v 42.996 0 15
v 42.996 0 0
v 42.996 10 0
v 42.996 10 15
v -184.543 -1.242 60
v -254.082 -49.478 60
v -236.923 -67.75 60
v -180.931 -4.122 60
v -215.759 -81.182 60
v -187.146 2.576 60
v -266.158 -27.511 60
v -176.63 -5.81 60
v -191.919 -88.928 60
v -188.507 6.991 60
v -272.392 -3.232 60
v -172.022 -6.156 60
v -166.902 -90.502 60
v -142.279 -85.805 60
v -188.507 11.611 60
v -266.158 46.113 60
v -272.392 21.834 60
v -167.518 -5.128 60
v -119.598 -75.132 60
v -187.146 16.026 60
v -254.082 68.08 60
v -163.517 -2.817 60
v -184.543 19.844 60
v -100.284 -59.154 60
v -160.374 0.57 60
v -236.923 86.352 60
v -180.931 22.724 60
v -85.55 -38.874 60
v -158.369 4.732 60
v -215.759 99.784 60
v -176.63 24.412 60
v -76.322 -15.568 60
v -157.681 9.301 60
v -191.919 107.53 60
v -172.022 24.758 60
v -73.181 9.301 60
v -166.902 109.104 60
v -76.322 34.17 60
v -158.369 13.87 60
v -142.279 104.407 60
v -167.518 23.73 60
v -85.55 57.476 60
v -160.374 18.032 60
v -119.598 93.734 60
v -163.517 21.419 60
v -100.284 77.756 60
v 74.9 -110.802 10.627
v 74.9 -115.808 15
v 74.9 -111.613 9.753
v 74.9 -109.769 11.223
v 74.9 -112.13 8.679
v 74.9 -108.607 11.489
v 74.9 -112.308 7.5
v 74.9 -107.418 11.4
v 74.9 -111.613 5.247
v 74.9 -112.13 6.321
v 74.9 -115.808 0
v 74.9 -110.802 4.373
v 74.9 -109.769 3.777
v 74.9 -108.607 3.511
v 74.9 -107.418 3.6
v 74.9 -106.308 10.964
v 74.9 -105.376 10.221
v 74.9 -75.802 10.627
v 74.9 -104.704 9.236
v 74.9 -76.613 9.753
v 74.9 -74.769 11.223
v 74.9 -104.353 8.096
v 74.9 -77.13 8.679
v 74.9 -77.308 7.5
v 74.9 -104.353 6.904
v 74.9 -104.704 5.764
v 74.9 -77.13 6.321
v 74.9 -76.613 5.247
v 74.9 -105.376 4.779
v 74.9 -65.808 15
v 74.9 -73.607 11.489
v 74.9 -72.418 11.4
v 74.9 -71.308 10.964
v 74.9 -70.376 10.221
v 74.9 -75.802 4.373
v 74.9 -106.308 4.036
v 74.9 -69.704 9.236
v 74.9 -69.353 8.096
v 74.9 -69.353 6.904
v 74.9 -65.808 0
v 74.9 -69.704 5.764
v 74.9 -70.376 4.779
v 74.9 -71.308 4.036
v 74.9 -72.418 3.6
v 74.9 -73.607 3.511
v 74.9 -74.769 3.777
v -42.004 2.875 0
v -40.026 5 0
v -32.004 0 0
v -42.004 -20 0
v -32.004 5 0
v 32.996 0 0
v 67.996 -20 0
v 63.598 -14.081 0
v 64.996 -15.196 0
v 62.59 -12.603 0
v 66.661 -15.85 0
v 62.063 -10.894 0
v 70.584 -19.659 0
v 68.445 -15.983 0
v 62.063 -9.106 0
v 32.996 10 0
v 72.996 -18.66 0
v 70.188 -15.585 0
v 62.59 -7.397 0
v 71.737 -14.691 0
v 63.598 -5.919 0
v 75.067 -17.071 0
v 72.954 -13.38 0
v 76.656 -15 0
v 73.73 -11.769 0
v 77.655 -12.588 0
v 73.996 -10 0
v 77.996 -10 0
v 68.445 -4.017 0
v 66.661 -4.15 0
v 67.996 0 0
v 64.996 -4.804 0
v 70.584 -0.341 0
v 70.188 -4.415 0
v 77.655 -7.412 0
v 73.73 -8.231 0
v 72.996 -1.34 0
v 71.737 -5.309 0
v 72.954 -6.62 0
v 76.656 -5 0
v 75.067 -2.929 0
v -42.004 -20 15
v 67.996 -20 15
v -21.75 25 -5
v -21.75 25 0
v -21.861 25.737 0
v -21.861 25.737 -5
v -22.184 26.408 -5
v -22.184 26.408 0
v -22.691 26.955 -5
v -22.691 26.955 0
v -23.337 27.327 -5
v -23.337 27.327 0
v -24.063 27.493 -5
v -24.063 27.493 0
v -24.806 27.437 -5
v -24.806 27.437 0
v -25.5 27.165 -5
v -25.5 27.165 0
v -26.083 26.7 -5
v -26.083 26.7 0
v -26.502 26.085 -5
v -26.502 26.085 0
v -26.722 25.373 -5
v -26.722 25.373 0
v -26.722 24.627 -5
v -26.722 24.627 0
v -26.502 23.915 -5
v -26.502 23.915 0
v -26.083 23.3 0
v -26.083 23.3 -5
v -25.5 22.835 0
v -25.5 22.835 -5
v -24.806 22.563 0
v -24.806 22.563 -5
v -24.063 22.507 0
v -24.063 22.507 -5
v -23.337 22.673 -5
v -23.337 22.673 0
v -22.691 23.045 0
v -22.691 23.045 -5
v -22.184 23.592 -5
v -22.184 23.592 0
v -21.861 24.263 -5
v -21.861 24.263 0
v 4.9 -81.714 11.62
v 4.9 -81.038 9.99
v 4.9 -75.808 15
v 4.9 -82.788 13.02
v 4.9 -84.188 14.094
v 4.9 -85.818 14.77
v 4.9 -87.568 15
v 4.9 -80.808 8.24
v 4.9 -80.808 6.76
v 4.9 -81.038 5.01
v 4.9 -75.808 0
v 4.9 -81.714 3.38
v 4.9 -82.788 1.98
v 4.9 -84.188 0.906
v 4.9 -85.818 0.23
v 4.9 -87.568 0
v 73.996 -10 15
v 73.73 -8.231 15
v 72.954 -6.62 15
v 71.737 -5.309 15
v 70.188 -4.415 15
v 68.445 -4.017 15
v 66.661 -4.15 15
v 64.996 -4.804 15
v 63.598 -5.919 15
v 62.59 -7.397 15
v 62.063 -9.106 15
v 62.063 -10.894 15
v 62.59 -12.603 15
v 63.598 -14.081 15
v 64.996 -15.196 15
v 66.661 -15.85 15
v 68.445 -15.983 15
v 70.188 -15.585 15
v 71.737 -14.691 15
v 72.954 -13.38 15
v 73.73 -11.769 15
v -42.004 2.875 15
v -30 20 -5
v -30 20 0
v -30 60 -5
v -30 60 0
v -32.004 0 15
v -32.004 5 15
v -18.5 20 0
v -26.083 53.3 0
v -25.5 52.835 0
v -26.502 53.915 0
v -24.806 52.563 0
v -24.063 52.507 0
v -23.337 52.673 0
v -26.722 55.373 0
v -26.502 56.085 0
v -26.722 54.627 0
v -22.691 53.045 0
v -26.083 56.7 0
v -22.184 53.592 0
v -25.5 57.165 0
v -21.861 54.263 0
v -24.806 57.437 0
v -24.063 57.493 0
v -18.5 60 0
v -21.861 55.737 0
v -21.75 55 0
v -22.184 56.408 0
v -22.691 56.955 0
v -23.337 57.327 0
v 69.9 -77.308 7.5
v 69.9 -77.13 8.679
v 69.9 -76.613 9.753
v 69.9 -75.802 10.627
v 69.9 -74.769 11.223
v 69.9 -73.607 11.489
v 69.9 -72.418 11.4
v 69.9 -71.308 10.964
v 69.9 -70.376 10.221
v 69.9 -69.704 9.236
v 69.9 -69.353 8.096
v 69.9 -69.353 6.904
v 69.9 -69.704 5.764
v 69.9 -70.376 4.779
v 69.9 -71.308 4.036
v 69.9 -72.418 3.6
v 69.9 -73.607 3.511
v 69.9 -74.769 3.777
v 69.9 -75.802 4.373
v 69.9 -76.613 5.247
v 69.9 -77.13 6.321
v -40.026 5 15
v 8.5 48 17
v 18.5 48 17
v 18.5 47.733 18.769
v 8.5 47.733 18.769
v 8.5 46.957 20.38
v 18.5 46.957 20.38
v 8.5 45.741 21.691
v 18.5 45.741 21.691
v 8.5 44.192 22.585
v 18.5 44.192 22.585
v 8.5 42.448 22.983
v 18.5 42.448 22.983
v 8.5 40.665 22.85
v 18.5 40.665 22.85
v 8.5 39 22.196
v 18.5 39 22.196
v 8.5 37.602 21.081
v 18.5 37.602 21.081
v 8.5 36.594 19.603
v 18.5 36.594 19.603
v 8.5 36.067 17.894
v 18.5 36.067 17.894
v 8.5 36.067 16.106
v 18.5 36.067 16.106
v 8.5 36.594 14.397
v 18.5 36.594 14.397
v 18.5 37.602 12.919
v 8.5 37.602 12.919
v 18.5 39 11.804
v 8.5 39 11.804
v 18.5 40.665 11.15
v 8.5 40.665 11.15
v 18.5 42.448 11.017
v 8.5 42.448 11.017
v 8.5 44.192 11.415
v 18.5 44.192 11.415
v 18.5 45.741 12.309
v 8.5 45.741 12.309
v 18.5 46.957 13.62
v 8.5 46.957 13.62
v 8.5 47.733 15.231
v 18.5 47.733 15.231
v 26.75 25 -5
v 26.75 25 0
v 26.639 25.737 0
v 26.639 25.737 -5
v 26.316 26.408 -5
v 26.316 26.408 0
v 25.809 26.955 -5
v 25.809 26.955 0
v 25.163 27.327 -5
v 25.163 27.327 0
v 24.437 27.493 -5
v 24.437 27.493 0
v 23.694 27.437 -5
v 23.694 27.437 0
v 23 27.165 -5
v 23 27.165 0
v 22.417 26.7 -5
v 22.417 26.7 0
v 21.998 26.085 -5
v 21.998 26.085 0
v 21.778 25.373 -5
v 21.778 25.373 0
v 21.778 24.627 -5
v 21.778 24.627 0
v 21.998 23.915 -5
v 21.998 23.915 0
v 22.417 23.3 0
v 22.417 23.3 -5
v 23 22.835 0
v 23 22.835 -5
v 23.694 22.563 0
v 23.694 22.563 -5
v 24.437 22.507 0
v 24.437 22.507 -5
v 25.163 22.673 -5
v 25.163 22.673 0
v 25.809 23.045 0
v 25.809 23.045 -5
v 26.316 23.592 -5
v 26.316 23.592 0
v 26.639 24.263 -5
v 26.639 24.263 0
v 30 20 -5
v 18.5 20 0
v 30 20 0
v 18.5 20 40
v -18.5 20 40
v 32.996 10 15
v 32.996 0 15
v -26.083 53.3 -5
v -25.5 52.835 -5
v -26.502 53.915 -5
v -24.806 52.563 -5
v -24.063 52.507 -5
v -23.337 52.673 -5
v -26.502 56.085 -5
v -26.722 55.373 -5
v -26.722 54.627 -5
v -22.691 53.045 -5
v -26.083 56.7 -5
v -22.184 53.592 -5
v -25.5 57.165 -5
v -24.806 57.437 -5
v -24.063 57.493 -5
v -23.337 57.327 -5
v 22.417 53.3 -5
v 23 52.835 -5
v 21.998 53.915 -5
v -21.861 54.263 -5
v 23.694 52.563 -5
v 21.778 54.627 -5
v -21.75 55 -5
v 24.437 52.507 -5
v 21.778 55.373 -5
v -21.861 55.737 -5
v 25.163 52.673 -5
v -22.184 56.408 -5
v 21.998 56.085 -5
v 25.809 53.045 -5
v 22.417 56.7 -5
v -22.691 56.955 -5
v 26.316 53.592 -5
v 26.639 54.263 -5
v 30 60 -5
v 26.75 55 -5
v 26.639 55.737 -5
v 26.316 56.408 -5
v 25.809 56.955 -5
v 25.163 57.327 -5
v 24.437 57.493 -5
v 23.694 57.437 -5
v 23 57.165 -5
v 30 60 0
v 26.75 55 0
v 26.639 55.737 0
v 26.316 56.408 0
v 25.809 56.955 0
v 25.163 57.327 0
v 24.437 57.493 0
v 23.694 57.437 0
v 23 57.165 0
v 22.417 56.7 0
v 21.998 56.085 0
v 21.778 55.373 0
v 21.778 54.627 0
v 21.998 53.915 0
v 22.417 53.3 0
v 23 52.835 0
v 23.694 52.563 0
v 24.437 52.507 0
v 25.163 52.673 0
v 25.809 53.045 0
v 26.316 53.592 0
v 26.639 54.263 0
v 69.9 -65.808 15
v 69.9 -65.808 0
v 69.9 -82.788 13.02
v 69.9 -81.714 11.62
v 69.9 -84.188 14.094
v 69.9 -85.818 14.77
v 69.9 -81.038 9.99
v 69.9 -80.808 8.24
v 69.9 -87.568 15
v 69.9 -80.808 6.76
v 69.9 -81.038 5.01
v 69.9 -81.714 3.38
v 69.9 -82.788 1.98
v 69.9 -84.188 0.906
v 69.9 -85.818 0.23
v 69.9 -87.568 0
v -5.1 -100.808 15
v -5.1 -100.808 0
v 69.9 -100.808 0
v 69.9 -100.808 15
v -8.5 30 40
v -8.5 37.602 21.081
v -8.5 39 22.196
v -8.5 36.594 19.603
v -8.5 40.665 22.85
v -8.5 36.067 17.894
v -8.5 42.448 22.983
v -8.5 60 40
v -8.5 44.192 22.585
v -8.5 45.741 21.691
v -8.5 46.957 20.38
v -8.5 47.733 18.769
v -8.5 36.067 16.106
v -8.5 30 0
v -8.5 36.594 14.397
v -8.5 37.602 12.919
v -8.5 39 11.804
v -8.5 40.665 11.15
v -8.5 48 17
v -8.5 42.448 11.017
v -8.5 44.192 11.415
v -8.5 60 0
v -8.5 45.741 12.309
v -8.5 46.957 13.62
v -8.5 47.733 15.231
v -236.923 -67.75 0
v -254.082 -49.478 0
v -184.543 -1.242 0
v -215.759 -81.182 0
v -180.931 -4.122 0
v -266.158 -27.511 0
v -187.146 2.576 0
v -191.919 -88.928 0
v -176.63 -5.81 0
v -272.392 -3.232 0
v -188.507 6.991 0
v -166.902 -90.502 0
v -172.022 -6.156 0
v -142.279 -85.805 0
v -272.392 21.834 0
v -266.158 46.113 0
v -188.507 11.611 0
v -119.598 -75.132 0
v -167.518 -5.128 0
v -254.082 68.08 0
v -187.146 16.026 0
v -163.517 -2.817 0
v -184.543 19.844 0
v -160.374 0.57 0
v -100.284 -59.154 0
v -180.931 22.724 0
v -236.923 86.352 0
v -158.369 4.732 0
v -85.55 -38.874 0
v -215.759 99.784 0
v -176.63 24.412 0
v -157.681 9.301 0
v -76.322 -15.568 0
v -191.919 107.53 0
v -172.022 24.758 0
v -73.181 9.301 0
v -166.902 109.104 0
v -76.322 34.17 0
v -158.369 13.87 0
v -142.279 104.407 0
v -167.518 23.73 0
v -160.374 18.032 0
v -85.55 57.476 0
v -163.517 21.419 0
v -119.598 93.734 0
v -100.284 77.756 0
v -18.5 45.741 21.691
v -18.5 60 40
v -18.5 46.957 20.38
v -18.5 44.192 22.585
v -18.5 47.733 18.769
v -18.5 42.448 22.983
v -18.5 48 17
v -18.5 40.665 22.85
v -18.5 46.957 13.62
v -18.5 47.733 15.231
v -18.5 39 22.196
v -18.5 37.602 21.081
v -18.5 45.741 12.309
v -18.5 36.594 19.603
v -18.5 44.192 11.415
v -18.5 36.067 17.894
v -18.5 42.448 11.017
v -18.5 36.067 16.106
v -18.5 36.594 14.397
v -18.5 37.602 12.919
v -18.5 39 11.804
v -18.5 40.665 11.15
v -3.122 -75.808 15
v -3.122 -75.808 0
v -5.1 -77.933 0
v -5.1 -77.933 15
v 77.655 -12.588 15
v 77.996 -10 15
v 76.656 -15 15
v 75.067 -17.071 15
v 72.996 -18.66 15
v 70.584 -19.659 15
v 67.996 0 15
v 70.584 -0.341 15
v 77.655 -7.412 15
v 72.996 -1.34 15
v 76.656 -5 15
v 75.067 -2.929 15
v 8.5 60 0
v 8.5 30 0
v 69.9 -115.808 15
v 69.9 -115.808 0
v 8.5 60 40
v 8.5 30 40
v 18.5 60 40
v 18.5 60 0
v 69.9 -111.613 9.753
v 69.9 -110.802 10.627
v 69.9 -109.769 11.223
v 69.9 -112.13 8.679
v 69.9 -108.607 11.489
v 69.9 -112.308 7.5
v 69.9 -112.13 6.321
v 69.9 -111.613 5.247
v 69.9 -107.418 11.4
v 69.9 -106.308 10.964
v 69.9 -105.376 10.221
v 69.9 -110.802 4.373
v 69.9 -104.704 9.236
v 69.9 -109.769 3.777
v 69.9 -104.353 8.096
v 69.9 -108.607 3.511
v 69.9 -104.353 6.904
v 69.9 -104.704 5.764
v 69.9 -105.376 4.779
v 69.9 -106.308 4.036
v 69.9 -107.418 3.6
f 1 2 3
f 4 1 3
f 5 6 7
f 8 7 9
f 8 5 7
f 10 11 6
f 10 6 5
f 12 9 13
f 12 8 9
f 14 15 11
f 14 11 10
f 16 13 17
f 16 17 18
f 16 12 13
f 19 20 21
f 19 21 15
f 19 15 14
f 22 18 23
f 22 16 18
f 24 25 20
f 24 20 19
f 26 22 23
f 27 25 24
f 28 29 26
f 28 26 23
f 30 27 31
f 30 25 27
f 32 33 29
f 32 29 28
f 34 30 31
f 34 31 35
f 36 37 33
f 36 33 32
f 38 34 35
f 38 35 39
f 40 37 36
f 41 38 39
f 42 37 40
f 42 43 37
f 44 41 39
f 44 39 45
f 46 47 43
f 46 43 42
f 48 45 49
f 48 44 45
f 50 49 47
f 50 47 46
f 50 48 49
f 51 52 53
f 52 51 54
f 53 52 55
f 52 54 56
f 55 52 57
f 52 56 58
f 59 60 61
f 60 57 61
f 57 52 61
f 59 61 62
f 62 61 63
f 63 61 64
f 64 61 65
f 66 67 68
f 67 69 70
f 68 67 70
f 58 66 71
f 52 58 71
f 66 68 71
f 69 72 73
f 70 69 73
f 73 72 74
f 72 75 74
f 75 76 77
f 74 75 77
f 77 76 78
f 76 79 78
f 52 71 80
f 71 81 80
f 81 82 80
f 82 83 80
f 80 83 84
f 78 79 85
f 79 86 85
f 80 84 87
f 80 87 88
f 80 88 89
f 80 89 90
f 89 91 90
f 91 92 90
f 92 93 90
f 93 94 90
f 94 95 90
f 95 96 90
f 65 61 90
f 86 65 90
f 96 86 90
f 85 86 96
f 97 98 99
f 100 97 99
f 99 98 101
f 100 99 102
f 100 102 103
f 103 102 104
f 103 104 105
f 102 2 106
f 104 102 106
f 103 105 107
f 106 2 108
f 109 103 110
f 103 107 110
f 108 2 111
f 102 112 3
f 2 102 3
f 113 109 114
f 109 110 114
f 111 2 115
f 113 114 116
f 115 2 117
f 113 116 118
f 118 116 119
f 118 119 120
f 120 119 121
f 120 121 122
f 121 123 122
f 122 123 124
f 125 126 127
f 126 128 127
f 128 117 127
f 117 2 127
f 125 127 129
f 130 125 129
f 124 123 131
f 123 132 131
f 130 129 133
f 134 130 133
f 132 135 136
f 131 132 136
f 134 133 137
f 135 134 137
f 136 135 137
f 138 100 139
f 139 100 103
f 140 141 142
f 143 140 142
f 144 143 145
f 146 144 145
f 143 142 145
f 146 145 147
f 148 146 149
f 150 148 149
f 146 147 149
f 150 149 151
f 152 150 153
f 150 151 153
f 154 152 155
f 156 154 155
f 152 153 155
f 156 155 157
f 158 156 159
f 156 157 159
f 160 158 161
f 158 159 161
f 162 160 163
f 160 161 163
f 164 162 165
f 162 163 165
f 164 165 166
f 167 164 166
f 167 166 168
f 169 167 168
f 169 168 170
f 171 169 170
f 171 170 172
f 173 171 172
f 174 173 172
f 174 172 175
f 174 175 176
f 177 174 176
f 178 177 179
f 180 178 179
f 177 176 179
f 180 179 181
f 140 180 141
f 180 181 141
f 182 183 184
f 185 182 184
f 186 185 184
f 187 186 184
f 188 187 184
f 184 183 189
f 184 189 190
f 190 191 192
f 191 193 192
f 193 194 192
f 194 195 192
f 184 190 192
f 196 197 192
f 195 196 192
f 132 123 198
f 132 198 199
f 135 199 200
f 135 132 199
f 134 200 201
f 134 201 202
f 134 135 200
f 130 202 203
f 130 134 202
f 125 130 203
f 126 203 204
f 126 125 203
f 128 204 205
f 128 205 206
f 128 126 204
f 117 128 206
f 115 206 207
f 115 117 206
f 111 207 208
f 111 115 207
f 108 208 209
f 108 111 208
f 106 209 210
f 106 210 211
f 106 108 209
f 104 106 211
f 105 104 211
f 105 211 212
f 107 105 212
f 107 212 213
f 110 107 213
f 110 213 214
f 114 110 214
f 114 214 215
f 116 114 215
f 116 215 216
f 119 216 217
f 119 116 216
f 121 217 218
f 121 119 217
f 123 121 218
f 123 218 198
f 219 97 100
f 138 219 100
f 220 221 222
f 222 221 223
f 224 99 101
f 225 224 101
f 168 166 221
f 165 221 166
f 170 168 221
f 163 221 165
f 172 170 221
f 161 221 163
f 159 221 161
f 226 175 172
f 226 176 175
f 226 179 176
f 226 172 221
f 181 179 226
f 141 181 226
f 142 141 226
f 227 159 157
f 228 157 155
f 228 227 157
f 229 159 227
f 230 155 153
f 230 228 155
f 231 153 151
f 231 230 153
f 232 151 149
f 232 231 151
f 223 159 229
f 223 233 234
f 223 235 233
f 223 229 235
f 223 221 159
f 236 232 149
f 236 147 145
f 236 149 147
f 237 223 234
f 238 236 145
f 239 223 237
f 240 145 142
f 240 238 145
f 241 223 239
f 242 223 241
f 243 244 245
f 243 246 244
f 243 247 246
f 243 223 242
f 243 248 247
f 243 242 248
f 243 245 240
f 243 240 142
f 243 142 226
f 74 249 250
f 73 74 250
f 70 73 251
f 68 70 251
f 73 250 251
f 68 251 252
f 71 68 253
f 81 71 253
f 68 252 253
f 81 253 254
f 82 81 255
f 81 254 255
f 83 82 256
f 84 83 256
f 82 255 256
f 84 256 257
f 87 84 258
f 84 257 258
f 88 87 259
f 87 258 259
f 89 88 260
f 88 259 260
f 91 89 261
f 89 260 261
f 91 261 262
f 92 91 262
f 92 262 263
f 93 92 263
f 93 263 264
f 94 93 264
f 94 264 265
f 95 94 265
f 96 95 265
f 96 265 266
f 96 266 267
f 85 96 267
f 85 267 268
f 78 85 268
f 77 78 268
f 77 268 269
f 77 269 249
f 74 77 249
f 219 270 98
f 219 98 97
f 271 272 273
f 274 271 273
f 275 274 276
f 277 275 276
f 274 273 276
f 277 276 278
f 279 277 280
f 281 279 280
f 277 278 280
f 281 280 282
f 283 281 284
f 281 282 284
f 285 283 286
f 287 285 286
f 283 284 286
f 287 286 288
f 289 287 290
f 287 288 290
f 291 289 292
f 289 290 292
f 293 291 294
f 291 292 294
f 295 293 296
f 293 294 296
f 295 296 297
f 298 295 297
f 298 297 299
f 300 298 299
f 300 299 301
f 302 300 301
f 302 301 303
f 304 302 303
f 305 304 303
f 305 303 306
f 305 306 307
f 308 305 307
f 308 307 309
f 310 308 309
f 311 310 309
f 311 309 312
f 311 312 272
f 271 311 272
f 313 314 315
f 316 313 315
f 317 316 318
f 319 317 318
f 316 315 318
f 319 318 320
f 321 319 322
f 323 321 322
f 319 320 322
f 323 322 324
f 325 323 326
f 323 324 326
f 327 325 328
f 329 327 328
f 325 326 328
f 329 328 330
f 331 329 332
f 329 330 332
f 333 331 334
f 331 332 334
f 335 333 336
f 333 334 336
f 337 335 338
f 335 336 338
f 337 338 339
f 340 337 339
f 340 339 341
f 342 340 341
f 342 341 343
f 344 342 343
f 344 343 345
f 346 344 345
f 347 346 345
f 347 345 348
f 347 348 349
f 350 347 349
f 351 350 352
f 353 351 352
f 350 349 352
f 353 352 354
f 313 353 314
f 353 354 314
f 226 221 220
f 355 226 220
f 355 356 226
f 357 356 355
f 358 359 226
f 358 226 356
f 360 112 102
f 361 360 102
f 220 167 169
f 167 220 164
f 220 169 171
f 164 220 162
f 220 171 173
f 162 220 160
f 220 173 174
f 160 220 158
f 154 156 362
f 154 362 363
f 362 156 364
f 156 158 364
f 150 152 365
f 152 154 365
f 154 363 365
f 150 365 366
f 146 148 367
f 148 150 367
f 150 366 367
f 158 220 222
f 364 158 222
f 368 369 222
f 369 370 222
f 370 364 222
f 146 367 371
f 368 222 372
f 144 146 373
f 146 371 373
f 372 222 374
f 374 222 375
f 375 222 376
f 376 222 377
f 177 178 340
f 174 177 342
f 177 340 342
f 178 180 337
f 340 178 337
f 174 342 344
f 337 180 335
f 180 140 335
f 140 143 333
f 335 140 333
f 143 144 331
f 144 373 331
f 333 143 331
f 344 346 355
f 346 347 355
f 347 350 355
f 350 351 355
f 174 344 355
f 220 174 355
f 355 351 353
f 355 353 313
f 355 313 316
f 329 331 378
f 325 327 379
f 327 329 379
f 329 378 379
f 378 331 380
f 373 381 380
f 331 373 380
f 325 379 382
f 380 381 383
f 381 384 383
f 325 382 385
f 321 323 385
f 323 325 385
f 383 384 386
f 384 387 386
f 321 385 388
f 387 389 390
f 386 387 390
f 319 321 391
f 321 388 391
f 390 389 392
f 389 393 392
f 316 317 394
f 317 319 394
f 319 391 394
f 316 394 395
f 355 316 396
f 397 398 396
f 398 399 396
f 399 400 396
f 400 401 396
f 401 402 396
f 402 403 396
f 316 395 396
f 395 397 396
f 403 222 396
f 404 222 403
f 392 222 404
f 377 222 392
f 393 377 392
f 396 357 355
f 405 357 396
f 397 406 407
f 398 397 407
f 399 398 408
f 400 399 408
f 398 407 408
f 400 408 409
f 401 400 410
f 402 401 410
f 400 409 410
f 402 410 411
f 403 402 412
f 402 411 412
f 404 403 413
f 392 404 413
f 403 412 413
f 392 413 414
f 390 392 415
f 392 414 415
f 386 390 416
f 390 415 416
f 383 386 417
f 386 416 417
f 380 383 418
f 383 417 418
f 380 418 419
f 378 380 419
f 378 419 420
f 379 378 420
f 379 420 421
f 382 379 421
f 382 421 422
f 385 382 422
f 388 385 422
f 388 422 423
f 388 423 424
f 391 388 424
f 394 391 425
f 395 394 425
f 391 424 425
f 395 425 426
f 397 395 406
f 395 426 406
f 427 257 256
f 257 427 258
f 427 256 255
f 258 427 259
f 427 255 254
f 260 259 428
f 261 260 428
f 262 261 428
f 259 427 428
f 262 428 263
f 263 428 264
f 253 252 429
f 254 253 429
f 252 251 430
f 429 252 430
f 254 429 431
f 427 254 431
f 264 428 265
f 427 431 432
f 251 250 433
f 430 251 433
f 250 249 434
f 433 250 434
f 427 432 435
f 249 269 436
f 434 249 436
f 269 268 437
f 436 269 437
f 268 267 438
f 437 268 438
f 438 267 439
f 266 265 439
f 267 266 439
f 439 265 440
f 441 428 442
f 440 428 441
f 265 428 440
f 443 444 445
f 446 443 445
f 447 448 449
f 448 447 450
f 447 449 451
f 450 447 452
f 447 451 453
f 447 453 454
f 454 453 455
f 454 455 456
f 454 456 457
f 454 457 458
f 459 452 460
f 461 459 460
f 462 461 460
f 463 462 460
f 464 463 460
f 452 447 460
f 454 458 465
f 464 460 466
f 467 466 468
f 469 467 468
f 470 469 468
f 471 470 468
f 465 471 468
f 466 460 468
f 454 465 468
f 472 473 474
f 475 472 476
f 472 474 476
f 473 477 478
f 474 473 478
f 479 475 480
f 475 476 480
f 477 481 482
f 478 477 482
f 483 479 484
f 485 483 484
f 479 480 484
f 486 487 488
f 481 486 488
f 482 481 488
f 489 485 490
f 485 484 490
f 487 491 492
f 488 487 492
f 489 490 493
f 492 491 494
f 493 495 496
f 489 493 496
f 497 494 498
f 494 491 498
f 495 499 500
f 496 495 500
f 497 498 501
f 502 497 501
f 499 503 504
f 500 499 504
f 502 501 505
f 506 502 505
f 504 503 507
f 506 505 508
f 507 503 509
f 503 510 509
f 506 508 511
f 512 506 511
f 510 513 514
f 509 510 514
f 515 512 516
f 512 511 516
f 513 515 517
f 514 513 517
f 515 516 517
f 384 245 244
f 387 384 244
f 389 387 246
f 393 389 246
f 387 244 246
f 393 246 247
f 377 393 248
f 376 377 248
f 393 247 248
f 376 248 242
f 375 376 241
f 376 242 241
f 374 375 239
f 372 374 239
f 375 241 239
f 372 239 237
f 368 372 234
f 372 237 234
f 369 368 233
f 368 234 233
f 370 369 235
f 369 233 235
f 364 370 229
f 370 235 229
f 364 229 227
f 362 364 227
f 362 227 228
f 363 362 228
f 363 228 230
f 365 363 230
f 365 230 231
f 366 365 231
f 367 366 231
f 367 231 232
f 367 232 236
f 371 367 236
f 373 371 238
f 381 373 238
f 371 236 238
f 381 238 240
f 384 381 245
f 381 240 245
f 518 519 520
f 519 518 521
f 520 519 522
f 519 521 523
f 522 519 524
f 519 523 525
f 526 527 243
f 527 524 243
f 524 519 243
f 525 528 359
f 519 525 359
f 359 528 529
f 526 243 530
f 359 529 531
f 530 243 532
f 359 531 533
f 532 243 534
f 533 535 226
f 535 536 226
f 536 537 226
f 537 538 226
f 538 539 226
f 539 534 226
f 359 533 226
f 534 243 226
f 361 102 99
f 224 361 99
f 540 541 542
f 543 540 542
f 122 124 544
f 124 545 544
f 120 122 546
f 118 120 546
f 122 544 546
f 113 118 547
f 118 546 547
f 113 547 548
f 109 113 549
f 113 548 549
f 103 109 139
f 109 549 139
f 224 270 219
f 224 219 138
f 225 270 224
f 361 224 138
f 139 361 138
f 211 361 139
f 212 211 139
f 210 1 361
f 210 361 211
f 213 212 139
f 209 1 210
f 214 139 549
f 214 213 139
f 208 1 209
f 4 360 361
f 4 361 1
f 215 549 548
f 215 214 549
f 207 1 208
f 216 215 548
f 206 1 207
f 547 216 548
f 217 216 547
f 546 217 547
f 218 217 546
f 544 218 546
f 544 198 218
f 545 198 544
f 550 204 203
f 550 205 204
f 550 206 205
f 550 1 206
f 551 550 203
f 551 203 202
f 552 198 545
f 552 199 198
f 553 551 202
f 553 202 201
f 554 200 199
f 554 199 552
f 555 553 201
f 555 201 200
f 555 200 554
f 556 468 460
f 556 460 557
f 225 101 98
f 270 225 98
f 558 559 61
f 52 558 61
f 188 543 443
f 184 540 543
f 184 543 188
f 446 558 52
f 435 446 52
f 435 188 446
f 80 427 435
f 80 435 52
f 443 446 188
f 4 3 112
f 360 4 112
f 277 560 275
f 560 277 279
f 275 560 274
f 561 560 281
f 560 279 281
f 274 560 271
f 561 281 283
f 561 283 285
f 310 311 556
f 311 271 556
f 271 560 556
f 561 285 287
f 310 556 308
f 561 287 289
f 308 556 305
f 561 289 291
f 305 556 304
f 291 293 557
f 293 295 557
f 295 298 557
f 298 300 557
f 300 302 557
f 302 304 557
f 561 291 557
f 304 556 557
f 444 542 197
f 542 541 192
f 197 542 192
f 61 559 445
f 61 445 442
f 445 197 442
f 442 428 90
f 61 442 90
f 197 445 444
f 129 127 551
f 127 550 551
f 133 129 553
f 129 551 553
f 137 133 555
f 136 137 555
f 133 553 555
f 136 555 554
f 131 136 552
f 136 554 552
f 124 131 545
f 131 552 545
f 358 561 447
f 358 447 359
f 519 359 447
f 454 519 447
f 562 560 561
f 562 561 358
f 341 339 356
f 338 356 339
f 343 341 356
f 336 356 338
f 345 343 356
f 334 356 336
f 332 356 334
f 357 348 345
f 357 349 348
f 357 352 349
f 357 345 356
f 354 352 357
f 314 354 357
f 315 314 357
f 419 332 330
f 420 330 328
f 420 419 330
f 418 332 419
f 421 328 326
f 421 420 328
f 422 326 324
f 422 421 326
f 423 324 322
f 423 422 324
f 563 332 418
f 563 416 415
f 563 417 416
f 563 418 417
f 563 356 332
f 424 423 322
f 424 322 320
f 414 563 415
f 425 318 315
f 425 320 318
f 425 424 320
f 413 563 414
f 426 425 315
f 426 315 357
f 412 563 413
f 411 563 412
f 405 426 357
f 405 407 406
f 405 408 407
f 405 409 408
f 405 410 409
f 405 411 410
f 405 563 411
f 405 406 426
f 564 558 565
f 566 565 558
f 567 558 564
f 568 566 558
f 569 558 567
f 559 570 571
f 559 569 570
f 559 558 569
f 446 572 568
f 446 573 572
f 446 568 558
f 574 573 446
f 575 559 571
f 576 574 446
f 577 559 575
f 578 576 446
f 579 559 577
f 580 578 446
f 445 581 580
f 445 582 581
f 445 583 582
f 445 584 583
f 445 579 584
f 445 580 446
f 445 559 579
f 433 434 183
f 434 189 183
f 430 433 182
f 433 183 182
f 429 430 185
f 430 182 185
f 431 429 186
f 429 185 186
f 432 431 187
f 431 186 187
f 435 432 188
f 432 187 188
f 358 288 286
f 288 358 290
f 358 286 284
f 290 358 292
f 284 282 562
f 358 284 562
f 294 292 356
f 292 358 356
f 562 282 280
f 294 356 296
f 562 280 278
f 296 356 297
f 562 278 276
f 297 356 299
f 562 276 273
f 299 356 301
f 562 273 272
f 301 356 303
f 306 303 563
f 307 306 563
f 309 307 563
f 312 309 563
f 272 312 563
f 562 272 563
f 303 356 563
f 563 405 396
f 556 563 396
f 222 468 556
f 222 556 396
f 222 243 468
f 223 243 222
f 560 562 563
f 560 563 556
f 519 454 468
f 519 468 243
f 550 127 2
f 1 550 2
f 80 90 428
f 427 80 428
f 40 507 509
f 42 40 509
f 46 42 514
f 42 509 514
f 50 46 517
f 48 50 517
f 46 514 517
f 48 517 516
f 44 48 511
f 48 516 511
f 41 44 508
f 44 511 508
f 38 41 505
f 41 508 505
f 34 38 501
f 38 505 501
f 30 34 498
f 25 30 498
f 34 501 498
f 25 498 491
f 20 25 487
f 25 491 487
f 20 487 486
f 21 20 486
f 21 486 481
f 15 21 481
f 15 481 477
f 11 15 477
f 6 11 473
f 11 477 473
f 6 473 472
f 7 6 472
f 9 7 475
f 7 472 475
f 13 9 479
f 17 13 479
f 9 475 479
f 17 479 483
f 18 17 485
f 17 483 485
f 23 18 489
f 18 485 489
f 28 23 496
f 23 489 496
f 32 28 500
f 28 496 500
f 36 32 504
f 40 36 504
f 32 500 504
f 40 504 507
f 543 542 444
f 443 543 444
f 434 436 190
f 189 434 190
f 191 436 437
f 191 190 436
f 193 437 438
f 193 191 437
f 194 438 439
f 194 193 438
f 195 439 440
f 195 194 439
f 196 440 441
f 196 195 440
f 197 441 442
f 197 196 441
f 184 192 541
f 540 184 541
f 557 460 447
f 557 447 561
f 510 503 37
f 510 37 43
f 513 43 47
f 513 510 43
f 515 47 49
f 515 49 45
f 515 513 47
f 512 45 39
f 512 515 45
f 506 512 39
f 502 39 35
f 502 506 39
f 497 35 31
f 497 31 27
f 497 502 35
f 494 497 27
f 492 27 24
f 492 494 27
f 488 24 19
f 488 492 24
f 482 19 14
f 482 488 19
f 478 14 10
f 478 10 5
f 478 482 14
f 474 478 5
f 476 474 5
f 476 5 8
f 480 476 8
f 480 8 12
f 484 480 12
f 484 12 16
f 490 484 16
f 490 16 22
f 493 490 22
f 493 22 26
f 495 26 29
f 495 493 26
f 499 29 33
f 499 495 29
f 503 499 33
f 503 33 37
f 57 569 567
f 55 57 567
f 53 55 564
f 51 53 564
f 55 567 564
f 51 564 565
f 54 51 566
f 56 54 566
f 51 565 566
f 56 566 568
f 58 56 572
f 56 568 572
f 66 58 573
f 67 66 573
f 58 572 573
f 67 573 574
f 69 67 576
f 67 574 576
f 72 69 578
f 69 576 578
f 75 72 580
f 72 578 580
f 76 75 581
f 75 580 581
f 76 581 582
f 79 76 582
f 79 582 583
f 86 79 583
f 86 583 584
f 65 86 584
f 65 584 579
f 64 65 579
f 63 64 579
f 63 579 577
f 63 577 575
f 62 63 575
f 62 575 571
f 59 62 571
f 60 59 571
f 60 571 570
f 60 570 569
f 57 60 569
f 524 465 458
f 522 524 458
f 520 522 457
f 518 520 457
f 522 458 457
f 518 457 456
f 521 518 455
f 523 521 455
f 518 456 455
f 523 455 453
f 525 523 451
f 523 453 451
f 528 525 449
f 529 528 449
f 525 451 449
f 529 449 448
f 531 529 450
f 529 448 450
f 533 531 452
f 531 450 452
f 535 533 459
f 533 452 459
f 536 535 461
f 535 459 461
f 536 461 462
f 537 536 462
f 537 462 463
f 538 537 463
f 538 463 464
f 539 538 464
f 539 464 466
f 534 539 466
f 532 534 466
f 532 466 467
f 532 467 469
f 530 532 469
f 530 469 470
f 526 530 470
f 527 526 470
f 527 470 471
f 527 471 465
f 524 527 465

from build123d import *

# Parameters (mm, degrees)
F0_R      = 6
F1_DEPTH  = 15
F0_W      = 11.5
F0_H      = 40
F0_R_2    = 2.5
F0_W_2    = 17
F0_H_2    = 10
F0_H_3    = 30
F2_DEPTH  = 5
F3_DEPTH  = 40
F4_R      = 9.99999
F5_R      = 6
F6_DEPTH  = 52.2
F0_R_3    = 100
F0_R_4    = 15.5
F7_DEPTH  = 60
F0_W_3    = 5
F0_H_4    = 15
F0_H_5    = 20
F8_DEPTH  = 15
F9_R      = 4
F10_DEPTH = 25
F11_R     = 6.7597979746


# Not quite as in the source:
# - a fillet or chamfer is up to 0.001 mm smaller than in the source, because OpenCascade refuses the exact size


with BuildPart() as f1:
    # F0 (on Top) → F1 (new body)
    with BuildSketch(Plane.XY):
        Polygon((32.9961277544, 0), (-32.0038722456, 0), (-32.0038722456, 5), (-40.0256873742, 5), (-42.0038722456, 2.8751766719), (-42.0038722456, 0), (-42.0038722456, -20), (77.9961277544, -20), (77.9961277544, 0), (42.9961277544, 0), (42.9961277544, 10), (32.9961277544, 10), align=None)
        with Locations((67.9961277544, -10)):
            Circle(F0_R, mode=Mode.SUBTRACT)
    extrude(amount=F1_DEPTH)

    # F4 (radius 10 in the source; OpenCascade refuses exactly that, so slightly less here)
    f4_edges = [f1.edges().sort_by_distance(p)[0] for p in [
        (77.996128, 0, 7.5),
        (77.996128, -20, 7.5),
    ]]
    fillet(f4_edges, radius=F4_R)


with BuildPart() as f2:
    # F0 (on Top) → F2 (new body)
    with BuildSketch(Plane.XY):
        with Locations((-24.25, 40)):
            Rectangle(F0_W, F0_H)
        with Locations((-24.25, 25)):
            Circle(F0_R_2, mode=Mode.SUBTRACT)
        with Locations((-24.25, 55)):
            Circle(F0_R_2, mode=Mode.SUBTRACT)
        Polygon((-8.5, 30), (-8.5, 60), (-18.5, 60), (-18.5, 20), (-8.5, 20), align=None)
        with Locations((0, 25)):
            Rectangle(F0_W_2, F0_H_2)
        Polygon((18.5, 20), (18.5, 60), (8.5, 60), (8.5, 30), (8.5, 20), align=None)
        with Locations((24.25, 40)):
            Rectangle(F0_W, F0_H)
        with Locations((24.25, 25)):
            Circle(F0_R_2, mode=Mode.SUBTRACT)
        with Locations((24.25, 55)):
            Circle(F0_R_2, mode=Mode.SUBTRACT)
        with Locations((0, 45)):
            Rectangle(F0_W_2, F0_H_3)
    extrude(amount=-F2_DEPTH)

    # F0 (on Top) → F3 (join)
    with BuildSketch(Plane.XY):
        Polygon((-8.5, 30), (-8.5, 60), (-18.5, 60), (-18.5, 20), (-8.5, 20), align=None)
        Polygon((18.5, 20), (18.5, 60), (8.5, 60), (8.5, 30), (8.5, 20), align=None)
        with Locations((0, 25)):
            Rectangle(F0_W_2, F0_H_2)
    extrude(amount=F3_DEPTH)

    # F5 (on face) → F6 (cut)
    with BuildSketch(Plane.YZ.offset(18.5)):
        with Locations((42, 17)):
            Circle(F5_R)
    extrude(amount=-F6_DEPTH, mode=Mode.SUBTRACT)


with BuildPart() as f7:
    # F0 (on Top) → F7 (new body)
    with BuildSketch(Plane.XY):
        with Locations((-173.1806099415, 9.3010207638)):
            Circle(F0_R_3)
        with Locations((-173.1806099415, 9.3010207638)):
            Circle(F0_R_4, mode=Mode.SUBTRACT)
    extrude(amount=F7_DEPTH)


with BuildPart() as f8:
    # F0 (on Top) → F8 (new body)
    with BuildSketch(Plane.XY):
        Polygon((59.8999890685, -80.8080112338), (4.8999890685, -80.8080112338), (4.8999890685, -75.8080112338), (-3.1218260601, -75.8080112338), (-5.1000109315, -77.9328345619), (-5.1000109315, -80.8080112338), (-5.1000109315, -100.8080112338), (69.8999890685, -100.8080112338), (69.8999890685, -80.8080112338), align=None)
        Polygon((69.8999890685, -70.8080112338), (69.8999890685, -80.8080112338), (74.8999890685, -80.8080112338), (74.8999890685, -65.8080112338), (69.8999890685, -65.8080112338), align=None)
        with Locations((72.3999890685, -108.3080112338)):
            Rectangle(F0_W_3, F0_H_4)
        with Locations((72.3999890685, -90.8080112338)):
            Rectangle(F0_W_3, F0_H_5)
    extrude(amount=F8_DEPTH)

    # F9 (on face) → F10 (cut)
    with BuildSketch(Plane(origin=(69.8999890685, 0, 0), x_dir=(0, -1, 0), z_dir=(-1, 0, 0))):
        with Locations((73.3080112338, 7.5)):
            Circle(F9_R)
        with Locations((108.3080112338, 7.5)):
            Circle(F9_R)
    extrude(amount=-F10_DEPTH, mode=Mode.SUBTRACT)

    # F11
    f11_edges = [f8.edges().sort_by_distance(p)[0] for p in [
        (37.399989, -80.808011, 0),
        (37.399989, -80.808011, 15),
    ]]
    fillet(f11_edges, radius=F11_R)


solid = Compound([f1.part, f2.part, f7.part, f8.part])
